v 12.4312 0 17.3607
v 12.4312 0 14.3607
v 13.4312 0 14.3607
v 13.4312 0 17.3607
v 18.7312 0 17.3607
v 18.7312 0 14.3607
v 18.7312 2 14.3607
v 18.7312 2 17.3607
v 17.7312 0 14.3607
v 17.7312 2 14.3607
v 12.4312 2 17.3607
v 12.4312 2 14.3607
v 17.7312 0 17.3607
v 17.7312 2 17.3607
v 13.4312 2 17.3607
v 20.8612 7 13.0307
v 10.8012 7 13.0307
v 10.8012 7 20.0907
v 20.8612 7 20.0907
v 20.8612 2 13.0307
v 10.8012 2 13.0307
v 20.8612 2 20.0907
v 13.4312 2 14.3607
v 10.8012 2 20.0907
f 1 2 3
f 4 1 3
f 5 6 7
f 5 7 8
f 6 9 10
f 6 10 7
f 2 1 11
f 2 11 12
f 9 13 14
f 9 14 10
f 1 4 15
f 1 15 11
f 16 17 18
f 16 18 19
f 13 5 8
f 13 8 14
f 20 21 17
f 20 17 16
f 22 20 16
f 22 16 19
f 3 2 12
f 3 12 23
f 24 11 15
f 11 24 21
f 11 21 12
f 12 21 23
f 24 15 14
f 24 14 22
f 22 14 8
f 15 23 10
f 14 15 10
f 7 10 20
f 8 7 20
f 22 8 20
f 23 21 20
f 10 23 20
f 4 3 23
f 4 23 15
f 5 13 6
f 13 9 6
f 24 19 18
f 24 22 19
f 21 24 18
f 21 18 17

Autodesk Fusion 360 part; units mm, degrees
sketch "Sketch1" plane through (0, 0, 0) normal (0, 1, 0) x (1, 0, 0)
  line L0 (12.4312, -14.3607) -> (13.4312, -14.3607)
  line L1 (13.4312, -14.3607) -> (13.4312, -17.3607)
  line L2 (13.4312, -17.3607) -> (12.4312, -17.3607)
  line L3 (12.4312, -17.3607) -> (12.4312, -14.3607)
  line L4 (12.9312, -14.3607) -> (12.9312, -17.3607) construction
  line L5 (12.4312, -15.8607) -> (13.4312, -15.8607) construction
  line L6 (13.4312, -15.8607) -> (18.2312, -15.8607) construction
  line L7 (18.2312, -14.3607) -> (18.2312, -17.3607) construction
  line L8 (17.7312, -14.3607) -> (18.7312, -14.3607)
  line L9 (18.7312, -14.3607) -> (18.7312, -17.3607)
  line L10 (18.7312, -17.3607) -> (17.7312, -17.3607)
  line L11 (17.7312, -17.3607) -> (17.7312, -14.3607)
  line L12 (9.8312, -10.8607) -> (21.8312, -10.8607)
  line L13 (21.8312, -10.8607) -> (21.8312, -22.2607)
  line L14 (21.8312, -22.2607) -> (9.8312, -22.2607)
  line L15 (9.8312, -22.2607) -> (9.8312, -10.8607)
  line L16 (15.8312, -10.8607) -> (15.8312, -22.2607) construction
  line L17 (21.8312, -16.5607) -> (9.8312, -16.5607) construction
  line L18 (10.0312, -12.2607) -> (21.6312, -12.2607)
  line L19 (21.6312, -12.2607) -> (21.6312, -20.8607)
  line L20 (21.6312, -20.8607) -> (10.0312, -20.8607)
  line L21 (10.0312, -20.8607) -> (10.0312, -12.2607)
  line L22 (10.8012, -13.0307) -> (20.8612, -13.0307)
  line L23 (20.8612, -13.0307) -> (20.8612, -20.0907)
  line L24 (20.8612, -20.0907) -> (10.8012, -20.0907)
  line L25 (10.8012, -20.0907) -> (10.8012, -13.0307)
  point P0 (15.8312, -15.8607)
  point P1 (21.6312, -16.5607)
  point P2 (15.8312, -12.2607)
  dimension "d3" = 1
  dimension "d4" = 3
  dimension "d6" = 1
  dimension "d7" = 3
  dimension "d8" = 5.3
  dimension "d9" = 12
  dimension "d10" = 11.4
  dimension "d11" = 5
  dimension "d14" = 11.6
  dimension "d15" = 8.6
  dimension "d17" = 0.77
  dimension "d18" = 0.77
  dimension "d19" = 0.77
  dimension "d20" = 0.77
extrude "Extrude1" add sketch "Sketch1" along normal blind 2 contours L0 L1 L2 L3 | L8 L9 L10 L11 makes body 1 at (13.4312, 0.6667, 15.3607) makes body 2 at (18.7312, 0.6667, 15.3607)
extrude "Extrude2" add sketch "Sketch1" along normal blind 5 from surface at 2 contours L0 L1 L2 L3 | L8 L9 L10 L11 | L22 L23 L24 L25 bodies 1 2
fillet "Fillet1" [suppressed]
sketch "Sketch2" plane through (0, 7, 0) normal (0, 1, 0) x (-1, 0, 0)
  line L0 (-16.9627, 13.8658) -> (-16.9627, 19.7076) construction
  line L1 (-16.9627, 19.7076) -> (-20.9627, 19.7076) construction
  line L2 (-20.9627, 19.7076) -> (-20.9627, 13.8658) construction
  line L3 (-20.9627, 13.8658) -> (-16.9627, 13.8658) construction
  line L4 (-11.5741, 13.8658) -> (-11.5741, 19.7076) construction
  line L5 (-11.5741, 19.7076) -> (-15.5741, 19.7076) construction
  line L6 (-15.5741, 19.7076) -> (-15.5741, 13.8658) construction
  line L7 (-15.5741, 13.8658) -> (-11.5741, 13.8658) construction
  line L8 (-10.8012, 13.0307) -> (-10.8012, 20.0907)
  line L9 (-10.8012, 20.0907) -> (-20.8612, 20.0907)
  line L10 (-20.8612, 20.0907) -> (-20.8612, 13.0307)
  line L11 (-20.8612, 13.0307) -> (-10.8012, 13.0307)
extrude "Extrude3" [suppressed]
extrude "Extrude4" [suppressed]
equation "PostW = 1 mm"
equation "PostH = 3 mm"
equation "d3 = PostW"
equation "d4 = PostH"
equation "d6 = PostW"
equation "d7 = PostH"
equation "HoleW = 8.6 mm"
equation "HoleH = 11.6 mm"
equation "d14 = HoleH"
equation "d15 = HoleW"
equation "HoleTol = 0.77 mm"
equation "d17 = HoleTol"
equation "d18 = HoleTol"
equation "d19 = HoleTol"
equation "d20 = HoleTol"
equation "CapD = 5 mm"
equation "PostD = 2 mm"
equation "d23 = PostD"
equation "d26 = CapD"
